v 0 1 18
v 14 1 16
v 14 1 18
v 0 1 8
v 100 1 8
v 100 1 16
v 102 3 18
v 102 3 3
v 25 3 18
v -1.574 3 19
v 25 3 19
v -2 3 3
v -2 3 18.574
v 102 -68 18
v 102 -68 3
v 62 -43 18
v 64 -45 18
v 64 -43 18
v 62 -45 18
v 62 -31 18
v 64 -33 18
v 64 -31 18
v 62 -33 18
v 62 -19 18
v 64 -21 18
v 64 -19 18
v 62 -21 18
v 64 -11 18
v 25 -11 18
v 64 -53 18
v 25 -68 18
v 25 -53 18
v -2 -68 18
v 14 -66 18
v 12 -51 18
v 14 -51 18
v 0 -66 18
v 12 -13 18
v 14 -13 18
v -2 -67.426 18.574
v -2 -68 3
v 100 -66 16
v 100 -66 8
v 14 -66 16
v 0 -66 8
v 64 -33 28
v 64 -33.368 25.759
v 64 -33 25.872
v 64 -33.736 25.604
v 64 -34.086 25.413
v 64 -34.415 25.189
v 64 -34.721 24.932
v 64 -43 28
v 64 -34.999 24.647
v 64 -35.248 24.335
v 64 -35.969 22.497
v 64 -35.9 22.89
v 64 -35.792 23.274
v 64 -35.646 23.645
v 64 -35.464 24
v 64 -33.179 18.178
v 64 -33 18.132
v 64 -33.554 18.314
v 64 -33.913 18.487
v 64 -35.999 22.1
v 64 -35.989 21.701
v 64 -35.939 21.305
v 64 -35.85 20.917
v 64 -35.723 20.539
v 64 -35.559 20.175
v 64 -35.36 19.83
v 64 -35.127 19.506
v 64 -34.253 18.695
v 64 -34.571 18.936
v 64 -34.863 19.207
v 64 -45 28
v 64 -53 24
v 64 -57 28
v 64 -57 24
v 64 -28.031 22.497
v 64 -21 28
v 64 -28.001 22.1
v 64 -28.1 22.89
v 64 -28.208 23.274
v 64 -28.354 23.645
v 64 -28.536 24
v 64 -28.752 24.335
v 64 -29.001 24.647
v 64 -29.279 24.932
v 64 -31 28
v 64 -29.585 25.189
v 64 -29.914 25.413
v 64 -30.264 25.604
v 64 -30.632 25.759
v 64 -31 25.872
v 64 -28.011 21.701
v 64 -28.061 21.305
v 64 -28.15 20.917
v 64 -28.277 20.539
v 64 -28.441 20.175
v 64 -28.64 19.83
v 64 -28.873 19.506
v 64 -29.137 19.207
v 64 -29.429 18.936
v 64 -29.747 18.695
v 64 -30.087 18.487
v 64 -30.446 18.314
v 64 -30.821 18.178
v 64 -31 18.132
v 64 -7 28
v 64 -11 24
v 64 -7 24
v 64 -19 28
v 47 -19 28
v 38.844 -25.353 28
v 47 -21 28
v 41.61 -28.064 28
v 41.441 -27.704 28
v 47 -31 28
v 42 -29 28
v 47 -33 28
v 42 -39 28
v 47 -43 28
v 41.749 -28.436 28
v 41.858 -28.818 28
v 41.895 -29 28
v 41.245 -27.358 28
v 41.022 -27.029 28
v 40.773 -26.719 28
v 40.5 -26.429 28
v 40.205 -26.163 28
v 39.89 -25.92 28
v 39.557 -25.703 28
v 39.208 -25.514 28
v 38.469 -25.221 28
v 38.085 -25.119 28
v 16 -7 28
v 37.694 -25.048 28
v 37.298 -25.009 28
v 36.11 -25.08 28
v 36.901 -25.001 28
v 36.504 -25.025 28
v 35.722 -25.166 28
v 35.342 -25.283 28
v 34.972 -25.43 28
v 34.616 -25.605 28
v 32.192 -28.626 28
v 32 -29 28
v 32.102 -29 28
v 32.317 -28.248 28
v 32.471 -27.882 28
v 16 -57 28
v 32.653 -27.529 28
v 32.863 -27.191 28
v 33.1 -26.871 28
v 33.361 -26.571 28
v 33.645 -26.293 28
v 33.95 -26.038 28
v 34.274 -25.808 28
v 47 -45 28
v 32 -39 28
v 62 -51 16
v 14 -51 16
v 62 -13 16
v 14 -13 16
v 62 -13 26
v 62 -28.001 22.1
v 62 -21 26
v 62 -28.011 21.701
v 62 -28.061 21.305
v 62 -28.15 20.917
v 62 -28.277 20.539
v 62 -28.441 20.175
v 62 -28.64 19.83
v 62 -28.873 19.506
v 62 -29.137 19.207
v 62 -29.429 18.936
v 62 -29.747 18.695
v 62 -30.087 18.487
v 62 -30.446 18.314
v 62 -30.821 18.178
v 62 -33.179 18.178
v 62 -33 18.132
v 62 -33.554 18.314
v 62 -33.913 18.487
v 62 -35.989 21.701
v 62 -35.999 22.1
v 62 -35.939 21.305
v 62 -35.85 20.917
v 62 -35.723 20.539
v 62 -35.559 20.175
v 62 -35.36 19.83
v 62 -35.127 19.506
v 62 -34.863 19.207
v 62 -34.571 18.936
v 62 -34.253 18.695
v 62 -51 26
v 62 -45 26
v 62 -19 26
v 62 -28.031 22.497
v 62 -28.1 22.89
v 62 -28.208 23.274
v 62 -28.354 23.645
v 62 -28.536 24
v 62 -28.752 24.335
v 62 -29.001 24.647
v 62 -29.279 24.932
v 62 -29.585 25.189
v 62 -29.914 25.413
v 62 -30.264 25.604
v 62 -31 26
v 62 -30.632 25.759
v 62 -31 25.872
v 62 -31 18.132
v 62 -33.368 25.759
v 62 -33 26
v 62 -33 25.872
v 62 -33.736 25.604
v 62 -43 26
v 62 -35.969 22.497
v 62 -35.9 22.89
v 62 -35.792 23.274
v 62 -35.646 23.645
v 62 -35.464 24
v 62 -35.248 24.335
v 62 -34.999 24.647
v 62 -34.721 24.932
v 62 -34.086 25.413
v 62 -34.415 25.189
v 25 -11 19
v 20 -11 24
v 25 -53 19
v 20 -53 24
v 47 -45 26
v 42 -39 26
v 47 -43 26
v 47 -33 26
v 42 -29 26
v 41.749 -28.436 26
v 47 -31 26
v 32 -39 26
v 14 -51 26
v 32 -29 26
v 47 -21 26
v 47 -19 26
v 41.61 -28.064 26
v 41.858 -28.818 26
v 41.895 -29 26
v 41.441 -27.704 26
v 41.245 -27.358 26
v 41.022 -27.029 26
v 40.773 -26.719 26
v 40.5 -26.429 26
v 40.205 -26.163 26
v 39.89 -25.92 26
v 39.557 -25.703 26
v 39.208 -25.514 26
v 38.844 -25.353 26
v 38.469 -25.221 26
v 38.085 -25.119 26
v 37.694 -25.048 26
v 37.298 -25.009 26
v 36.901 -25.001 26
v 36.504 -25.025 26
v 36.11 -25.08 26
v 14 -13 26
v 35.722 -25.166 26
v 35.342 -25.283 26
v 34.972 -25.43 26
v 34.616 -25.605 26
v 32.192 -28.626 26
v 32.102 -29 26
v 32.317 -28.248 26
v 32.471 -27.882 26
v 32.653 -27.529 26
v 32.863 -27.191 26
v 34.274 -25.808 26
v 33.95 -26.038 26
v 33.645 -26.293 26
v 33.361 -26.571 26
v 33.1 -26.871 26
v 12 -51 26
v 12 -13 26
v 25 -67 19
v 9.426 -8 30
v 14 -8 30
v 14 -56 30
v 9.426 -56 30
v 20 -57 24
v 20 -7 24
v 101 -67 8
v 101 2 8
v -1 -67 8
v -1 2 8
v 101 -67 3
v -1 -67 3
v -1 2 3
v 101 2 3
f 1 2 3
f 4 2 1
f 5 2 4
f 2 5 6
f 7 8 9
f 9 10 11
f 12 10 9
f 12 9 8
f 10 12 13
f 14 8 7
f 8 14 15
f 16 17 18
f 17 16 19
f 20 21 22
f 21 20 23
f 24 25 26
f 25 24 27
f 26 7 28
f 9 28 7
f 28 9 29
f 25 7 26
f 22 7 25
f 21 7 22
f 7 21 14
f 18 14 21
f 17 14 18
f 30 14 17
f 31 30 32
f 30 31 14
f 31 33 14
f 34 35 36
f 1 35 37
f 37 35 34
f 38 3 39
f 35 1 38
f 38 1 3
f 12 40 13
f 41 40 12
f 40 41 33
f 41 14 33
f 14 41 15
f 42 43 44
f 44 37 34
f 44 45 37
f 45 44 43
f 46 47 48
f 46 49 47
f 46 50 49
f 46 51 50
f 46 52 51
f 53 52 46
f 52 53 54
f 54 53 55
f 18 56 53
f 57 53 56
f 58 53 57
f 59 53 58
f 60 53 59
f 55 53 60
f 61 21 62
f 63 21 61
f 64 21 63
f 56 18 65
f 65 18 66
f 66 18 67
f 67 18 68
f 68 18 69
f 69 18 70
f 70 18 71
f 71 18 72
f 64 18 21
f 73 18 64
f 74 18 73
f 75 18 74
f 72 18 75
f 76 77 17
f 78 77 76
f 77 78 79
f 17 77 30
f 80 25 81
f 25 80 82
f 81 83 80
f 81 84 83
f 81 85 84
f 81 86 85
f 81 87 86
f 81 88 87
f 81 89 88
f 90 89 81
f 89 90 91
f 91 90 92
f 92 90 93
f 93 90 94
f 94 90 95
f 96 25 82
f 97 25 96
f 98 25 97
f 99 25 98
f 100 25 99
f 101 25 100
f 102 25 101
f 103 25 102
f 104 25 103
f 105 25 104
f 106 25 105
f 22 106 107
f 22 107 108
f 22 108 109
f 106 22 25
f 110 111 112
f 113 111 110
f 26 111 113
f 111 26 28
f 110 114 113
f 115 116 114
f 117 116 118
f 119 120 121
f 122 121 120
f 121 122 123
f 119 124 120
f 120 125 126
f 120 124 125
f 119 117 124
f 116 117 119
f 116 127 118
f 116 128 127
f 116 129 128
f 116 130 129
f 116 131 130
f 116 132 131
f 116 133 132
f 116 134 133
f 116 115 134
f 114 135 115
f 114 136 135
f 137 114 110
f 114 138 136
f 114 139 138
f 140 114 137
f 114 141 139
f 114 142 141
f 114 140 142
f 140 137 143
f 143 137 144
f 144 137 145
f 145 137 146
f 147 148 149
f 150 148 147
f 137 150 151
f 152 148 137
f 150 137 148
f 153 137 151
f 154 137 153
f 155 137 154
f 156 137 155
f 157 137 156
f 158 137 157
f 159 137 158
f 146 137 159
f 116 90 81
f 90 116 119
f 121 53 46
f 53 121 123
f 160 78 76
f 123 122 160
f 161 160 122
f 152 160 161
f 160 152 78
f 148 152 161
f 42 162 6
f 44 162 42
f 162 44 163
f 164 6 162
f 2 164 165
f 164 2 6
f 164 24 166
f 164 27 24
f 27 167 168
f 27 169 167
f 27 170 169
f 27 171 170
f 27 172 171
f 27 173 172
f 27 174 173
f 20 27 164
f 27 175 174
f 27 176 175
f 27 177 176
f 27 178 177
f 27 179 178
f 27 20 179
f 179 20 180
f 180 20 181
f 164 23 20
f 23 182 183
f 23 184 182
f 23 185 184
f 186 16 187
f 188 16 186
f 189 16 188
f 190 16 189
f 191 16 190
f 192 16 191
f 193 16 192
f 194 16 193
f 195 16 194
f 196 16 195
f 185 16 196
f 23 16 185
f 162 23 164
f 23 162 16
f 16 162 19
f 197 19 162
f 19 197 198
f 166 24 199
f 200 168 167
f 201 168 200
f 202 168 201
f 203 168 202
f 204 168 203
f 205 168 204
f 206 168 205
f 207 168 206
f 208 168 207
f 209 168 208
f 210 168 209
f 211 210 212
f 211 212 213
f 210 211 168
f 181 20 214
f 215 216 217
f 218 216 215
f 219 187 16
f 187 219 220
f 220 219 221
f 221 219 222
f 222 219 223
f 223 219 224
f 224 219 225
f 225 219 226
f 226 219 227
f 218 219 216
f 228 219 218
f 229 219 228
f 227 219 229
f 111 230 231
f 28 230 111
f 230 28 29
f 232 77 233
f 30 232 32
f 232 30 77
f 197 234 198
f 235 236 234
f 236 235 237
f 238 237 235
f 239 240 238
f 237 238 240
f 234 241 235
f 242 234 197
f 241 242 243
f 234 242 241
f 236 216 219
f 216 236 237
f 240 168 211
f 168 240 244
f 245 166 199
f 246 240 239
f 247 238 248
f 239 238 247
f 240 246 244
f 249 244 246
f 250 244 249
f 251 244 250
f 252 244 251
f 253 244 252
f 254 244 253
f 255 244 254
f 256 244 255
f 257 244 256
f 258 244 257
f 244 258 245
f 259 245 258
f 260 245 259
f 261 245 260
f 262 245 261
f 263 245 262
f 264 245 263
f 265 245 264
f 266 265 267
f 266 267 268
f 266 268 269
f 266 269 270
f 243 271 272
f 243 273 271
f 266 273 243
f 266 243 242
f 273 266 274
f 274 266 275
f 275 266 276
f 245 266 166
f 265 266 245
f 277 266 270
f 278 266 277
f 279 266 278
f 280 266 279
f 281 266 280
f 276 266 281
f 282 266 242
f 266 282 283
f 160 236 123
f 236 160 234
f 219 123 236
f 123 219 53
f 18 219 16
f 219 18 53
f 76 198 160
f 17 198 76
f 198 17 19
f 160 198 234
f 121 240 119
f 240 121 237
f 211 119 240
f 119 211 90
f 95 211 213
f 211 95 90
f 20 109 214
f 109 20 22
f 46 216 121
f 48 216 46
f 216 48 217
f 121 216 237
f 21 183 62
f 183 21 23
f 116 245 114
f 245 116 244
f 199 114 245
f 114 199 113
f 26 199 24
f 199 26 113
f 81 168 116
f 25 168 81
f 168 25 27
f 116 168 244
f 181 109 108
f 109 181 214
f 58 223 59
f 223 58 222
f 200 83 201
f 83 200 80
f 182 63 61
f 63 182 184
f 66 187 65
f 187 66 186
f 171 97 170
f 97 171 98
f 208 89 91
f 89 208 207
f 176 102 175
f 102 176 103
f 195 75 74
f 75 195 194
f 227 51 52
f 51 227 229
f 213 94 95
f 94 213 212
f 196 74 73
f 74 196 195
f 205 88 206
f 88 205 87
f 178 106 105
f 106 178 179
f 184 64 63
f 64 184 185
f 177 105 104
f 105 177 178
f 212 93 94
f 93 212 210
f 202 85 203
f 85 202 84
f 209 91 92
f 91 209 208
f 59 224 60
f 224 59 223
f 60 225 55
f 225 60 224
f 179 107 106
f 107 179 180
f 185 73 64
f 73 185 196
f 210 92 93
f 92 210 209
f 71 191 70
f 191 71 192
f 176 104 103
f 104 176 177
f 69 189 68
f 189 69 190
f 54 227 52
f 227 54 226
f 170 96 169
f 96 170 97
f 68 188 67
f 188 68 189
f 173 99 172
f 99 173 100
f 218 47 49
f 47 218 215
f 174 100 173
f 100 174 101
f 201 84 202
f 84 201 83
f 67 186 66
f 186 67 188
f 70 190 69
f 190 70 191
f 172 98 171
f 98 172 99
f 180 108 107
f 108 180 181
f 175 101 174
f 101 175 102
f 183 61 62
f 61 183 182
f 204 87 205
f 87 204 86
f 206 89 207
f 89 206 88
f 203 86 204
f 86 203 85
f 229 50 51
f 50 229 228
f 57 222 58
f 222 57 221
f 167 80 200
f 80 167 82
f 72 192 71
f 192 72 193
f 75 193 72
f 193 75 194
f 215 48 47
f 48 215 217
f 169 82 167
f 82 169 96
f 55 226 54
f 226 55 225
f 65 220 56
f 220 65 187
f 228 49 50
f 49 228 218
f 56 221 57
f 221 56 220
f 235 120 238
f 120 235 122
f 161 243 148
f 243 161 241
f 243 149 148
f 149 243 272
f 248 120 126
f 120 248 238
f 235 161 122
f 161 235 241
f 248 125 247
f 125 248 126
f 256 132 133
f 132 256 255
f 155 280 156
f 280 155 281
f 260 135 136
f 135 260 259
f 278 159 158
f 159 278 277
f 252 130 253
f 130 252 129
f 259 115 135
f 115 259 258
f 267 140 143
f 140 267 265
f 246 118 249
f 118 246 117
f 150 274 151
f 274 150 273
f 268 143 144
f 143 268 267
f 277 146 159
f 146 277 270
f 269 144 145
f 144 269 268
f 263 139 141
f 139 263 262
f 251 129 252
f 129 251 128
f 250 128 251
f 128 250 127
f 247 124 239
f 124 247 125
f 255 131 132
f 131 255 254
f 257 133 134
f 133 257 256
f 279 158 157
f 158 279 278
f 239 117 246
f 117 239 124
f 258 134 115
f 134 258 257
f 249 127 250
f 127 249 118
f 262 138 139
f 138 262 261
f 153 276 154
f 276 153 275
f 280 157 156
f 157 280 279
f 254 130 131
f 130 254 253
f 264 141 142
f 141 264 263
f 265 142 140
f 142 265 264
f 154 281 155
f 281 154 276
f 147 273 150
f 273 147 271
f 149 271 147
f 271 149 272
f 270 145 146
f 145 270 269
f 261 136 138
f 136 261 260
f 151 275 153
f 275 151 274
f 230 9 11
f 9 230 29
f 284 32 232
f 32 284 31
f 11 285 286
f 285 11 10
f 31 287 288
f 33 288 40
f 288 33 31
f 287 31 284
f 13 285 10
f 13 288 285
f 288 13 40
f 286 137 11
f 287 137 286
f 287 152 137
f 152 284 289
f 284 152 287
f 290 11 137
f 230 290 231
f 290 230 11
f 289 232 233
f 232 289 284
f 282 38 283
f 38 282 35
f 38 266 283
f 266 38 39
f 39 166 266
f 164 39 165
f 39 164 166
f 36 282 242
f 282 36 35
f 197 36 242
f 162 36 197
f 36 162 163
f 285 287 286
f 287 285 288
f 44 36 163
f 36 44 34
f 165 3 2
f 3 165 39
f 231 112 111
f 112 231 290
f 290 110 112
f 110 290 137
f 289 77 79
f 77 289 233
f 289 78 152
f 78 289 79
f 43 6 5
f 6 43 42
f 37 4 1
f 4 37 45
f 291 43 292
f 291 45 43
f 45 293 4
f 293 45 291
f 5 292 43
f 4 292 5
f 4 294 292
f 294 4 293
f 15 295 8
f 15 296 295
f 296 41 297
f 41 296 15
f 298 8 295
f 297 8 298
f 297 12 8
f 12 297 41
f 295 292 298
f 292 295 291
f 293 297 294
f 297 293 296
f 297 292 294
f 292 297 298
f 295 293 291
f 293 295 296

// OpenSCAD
$fa = 1;
$fs = .4;

upPart = true;
downPart = false;
downPart2 = false;

// batteries
//color([1, 0, 0, .9]) batteries();

// case
//case();

if(upPart){

  difference(){
    case();
    translate([-5, -90, -22])
      cube([110, 110, 30]);
  }
  
    difference() {
    translate([-2, -68, 3])
      cube([104, 71, 10]);
    translate([-1, -67, 3])
      cube([102, 69, 10]);
  }
}

if(downPart){
  
  difference(){
    case();
    translate([-5, -90, 5])
      cube([110, 110, 30]);
  }
  
  difference() {
    translate([-1, -67, 0])
      cube([102, 69, 10]);
    translate([0, -66, 0])
      cube([100, 67, 10]);
  }
}

if(downPart2){

  difference(){
    case();
    translate([-5, -90, 5])
      cube([110, 110, 30]);
  }
  
  translate([0, 0, 18])
  difference() {
    translate([-1, -67, 0])
      cube([102, 69, 10]);
    translate([0, -66, 0])
      cube([100, 67, 10]);
  }
  
  translate([0, 0, 5])
  difference() {
    translate([-2, -68, 0])
      cube([104, 71, 18]);
    translate([0, -66, 0])
      cube([100, 67, 18]);
  }

}

// batteries
module batteries(){
  translate([10, 0, 0])
  rotate([90, 0, 0])
  hull(){
    translate([0,0,0])
      cylinder(65, 10, 10);
    translate([80,0,0])
      cylinder(65, 10, 10);
  }

  //panel
  translate([10, -64, 6])
    cube([86, 62, 10]);
  // plug
  translate([25, -50, 16])
    cube([26, 36, 10]);
  // spring
  translate([6,-30,0])
    cylinder(19, 2.5, 2.5);
}


module case() {
  // sides
  side();
  translate([0, -69, 0])
    side();
  module side(){
    translate([10, 3, 0])
    rotate([90, 0, 0])
    hull(){
      translate([0, 0, 0])
        cylinder(2, 12, 12);
      translate([80,0,0])
        cylinder(2, 12, 12);
    }

    translate([-2, 1, 0])
      cube([104, 2, 18]);
  }

  // bottom
  translate([9, -68, -12])
    cube([82, 71, 2]);
  rotate([90, 0, 0])
    translate([10, 0, -3])
      difference() {
        cylinder(71, 12, 12);
        cylinder(71, 11, 11);
        translate([-12, 0, 0])
          cube([24, 12, 72]);
        translate([0, -12, 0])
          cube([24, 12, 72]);
      }
  rotate([90, 0, 0])    
    translate([90, 0, -3])
      difference() {
        cylinder(71, 12, 12);
        cylinder(71, 11, 11);
        translate([-12, -12, 0])
          cube([12, 24, 72]);
        translate([-12, 0, 0])
          cube([24, 12, 72]);
      }


  // top
  translate([62, -68, 16])
    cube([40, 71, 2]);
      
  translate([14, -68, 16])
    cube([48, 16, 2]);
  translate([14, -53, 16])    
    cube([48, 2, 12]);    
      
  translate([14, -13, 16])
    cube([48, 16, 2]);
  translate([14, -13, 16])    
    cube([48, 2, 12]);
      
  translate([42, -53, 16])
  difference(){
    union() {
      translate([20, 0, 0])
        cube([2, 42, 12]);
      translate([-28, 0, 10])
        cube([50, 42, 2]);
      }  
      // poles
      translate([5, 8, 2])
        cube([34, 2, 12]);
      translate([5, 20, 2])
        cube([34, 2, 12]);
      translate([5, 32, 2])
        cube([34, 2, 12]);
      // connector
      translate([-2, 21, 6])
        rotate([0, 90, 0])
          cylinder(30, 4, 4);
      // upper
      translate([-10, 14, 4])
        cube([10, 10, 10]);
      translate([-5, 23, 4])
        cylinder(10, 5, 5);
        
  }
  // rail
  translate([14, -11, 24])
    cube([50, 4, 4]);
  translate([14, -57, 24])
    cube([50, 4, 4]);
      

  // front
  translate([100, -68, 0])    
      cube([2, 71, 18]);

  //back
  translate([-2, -68, 0])    
      cube([2, 71, 18]);
  difference() {
    translate([-2, -68, 18])
      cube([27, 71, 14]);
    
    translate([-4, 10, 12])
      rotate([45, 0, 0])
        cube([30,30,30]);

    translate([-4, -74, 12])
      rotate([45, 0, 0])
        cube([30,30,30]);

    translate([-30, -74, 33])
      rotate([0, 45, 0])
        cube([30,80,30]);
    // right
    translate([13, -74, 31])
      rotate([0, 45, 0])
        cube([30,80,30]);
    // bottom
    translate([12, -51, 10])
        cube([50, 38, 16]);
    // top
    translate([5, -74, 30])
        cube([10, 80, 10]);
  }
}
